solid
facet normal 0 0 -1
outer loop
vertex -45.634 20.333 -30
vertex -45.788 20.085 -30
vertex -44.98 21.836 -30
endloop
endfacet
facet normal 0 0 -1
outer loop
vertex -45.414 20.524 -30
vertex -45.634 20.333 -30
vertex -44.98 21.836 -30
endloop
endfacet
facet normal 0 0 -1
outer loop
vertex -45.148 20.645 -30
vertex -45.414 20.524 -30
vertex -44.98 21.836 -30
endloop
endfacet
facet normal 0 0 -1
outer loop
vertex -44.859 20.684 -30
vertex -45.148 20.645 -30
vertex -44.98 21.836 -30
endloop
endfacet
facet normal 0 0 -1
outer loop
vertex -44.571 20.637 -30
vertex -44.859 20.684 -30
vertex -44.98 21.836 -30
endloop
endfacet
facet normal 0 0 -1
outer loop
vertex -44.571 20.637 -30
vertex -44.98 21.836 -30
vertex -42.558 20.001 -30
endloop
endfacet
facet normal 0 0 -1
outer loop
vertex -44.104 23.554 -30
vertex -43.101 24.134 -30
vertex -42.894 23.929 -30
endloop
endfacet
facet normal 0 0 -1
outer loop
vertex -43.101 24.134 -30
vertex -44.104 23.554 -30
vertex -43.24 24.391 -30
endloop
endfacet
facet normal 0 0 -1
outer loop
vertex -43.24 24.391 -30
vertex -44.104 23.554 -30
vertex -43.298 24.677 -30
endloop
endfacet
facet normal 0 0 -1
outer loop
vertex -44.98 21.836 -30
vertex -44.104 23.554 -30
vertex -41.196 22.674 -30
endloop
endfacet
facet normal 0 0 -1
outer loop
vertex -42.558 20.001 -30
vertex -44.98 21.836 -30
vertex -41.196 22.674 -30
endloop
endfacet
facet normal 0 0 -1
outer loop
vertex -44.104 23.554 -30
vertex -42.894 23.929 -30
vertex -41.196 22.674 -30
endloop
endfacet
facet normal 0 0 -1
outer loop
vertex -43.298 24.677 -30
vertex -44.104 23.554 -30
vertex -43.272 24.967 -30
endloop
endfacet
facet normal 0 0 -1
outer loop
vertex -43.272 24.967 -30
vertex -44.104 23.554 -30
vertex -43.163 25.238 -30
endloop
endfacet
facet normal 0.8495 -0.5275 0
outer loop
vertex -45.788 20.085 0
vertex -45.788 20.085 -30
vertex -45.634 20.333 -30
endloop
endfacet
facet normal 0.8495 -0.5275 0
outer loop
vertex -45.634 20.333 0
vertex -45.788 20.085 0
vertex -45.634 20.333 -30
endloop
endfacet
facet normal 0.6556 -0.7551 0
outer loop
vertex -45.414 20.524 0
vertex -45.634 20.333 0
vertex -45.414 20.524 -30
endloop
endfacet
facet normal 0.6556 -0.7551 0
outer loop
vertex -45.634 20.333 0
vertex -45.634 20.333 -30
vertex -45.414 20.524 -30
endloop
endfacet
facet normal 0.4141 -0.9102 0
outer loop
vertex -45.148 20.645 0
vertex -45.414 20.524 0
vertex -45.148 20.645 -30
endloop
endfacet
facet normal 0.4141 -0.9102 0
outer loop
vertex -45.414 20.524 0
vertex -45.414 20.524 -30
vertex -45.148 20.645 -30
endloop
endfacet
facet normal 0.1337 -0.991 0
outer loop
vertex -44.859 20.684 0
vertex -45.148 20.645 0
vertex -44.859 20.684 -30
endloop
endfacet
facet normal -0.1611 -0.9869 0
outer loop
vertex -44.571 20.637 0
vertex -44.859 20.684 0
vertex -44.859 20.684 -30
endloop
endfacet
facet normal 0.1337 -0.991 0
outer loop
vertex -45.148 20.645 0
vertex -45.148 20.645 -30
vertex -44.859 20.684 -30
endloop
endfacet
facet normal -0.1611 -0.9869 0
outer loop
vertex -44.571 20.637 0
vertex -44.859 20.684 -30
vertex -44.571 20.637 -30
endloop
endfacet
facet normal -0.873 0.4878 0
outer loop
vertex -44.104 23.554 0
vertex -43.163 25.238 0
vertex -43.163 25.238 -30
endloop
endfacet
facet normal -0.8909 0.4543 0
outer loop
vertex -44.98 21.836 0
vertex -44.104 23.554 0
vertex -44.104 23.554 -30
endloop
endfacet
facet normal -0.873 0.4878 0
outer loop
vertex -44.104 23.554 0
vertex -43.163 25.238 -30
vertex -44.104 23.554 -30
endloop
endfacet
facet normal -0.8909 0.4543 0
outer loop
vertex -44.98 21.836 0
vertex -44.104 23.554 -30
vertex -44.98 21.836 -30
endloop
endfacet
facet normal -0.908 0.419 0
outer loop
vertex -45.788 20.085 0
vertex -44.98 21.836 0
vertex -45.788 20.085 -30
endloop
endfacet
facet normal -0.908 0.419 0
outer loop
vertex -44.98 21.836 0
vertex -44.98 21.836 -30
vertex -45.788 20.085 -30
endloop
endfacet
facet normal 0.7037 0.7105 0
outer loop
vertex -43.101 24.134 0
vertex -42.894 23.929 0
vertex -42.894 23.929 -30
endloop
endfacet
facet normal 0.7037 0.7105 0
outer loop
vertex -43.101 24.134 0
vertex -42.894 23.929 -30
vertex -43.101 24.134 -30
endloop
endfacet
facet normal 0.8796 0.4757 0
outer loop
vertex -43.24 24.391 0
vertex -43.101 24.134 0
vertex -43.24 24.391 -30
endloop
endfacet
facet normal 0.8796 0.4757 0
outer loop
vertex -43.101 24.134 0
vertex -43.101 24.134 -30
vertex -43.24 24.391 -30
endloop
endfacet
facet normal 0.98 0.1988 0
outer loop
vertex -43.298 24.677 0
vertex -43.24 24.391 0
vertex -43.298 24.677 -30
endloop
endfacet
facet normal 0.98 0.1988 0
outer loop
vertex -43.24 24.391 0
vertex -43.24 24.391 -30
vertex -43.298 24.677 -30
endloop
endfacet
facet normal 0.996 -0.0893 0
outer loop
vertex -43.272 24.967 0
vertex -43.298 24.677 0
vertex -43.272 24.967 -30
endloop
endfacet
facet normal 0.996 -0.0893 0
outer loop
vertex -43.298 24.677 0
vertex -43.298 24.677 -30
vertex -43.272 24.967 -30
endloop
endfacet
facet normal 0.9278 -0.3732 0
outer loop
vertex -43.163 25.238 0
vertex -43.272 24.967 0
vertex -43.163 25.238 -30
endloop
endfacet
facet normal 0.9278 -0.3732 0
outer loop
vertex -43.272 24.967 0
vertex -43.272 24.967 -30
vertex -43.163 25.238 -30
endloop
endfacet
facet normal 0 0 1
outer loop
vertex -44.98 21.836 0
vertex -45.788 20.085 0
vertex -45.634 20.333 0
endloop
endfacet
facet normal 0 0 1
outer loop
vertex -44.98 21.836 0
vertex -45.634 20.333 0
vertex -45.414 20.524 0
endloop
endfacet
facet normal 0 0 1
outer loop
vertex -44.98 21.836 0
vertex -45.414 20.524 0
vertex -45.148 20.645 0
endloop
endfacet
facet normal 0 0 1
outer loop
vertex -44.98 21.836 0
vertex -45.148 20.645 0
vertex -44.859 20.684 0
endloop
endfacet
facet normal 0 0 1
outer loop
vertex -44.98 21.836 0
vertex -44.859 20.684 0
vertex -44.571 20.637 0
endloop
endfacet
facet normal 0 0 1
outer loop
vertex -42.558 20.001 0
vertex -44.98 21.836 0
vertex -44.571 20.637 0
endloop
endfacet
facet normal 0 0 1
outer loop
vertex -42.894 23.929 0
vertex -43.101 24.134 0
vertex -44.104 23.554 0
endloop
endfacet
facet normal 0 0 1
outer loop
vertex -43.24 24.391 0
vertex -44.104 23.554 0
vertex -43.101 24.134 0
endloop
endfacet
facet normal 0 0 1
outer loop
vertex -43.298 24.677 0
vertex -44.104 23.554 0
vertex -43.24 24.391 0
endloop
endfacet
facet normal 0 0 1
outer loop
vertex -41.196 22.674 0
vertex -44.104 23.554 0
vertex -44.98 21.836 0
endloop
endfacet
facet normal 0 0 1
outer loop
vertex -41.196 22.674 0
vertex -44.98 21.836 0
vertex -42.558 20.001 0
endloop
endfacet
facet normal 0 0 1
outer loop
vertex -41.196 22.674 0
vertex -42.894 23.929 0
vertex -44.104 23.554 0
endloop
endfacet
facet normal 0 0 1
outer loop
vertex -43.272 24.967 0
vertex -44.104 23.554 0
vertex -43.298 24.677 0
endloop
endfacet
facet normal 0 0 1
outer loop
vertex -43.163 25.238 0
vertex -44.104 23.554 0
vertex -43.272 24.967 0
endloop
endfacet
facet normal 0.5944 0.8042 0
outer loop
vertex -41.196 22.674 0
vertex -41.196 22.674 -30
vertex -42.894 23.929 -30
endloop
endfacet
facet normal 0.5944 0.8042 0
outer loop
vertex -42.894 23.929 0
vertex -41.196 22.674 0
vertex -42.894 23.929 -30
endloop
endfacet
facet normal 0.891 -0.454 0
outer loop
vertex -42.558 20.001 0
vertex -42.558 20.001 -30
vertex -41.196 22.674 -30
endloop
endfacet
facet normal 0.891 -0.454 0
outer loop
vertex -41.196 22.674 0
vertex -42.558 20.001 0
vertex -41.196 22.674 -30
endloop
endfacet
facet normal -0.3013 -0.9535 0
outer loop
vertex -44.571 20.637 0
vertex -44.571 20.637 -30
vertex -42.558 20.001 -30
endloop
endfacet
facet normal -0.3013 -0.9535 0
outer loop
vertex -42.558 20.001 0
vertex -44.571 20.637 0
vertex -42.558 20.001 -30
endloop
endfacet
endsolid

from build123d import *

# Parameters (mm, degrees)
BOSS_EXTRUDE1_DEPTH = 30


with BuildPart() as part:
    # Sketch2 → Boss-Extrude1 (new body)
    with BuildSketch(Plane(origin=(0, 0, -30), x_dir=(-1, 0, 0), z_dir=(0, 0, -1))):
        with BuildLine():
            Line((44.571295977, 20.637196951), (42.558292386, 20.001043701))
            Line((42.558292386, 20.001043701), (41.196320887, 22.674063274))
            Line((41.196320887, 22.674063274), (42.8941935, 23.92869589))
            ThreePointArc((42.8941935, 23.92869589), (43.279434932, 24.531672134), (43.163162714, 25.237697687))
            ThreePointArc((43.163162714, 25.237697687), (44.550326209, 22.699524987), (45.788396813, 20.085385664))
            ThreePointArc((45.788396813, 20.085385664), (45.285553237, 20.594443273), (44.571295977, 20.637196951))
        make_face()
    extrude(amount=-BOSS_EXTRUDE1_DEPTH)


solid = part.part
